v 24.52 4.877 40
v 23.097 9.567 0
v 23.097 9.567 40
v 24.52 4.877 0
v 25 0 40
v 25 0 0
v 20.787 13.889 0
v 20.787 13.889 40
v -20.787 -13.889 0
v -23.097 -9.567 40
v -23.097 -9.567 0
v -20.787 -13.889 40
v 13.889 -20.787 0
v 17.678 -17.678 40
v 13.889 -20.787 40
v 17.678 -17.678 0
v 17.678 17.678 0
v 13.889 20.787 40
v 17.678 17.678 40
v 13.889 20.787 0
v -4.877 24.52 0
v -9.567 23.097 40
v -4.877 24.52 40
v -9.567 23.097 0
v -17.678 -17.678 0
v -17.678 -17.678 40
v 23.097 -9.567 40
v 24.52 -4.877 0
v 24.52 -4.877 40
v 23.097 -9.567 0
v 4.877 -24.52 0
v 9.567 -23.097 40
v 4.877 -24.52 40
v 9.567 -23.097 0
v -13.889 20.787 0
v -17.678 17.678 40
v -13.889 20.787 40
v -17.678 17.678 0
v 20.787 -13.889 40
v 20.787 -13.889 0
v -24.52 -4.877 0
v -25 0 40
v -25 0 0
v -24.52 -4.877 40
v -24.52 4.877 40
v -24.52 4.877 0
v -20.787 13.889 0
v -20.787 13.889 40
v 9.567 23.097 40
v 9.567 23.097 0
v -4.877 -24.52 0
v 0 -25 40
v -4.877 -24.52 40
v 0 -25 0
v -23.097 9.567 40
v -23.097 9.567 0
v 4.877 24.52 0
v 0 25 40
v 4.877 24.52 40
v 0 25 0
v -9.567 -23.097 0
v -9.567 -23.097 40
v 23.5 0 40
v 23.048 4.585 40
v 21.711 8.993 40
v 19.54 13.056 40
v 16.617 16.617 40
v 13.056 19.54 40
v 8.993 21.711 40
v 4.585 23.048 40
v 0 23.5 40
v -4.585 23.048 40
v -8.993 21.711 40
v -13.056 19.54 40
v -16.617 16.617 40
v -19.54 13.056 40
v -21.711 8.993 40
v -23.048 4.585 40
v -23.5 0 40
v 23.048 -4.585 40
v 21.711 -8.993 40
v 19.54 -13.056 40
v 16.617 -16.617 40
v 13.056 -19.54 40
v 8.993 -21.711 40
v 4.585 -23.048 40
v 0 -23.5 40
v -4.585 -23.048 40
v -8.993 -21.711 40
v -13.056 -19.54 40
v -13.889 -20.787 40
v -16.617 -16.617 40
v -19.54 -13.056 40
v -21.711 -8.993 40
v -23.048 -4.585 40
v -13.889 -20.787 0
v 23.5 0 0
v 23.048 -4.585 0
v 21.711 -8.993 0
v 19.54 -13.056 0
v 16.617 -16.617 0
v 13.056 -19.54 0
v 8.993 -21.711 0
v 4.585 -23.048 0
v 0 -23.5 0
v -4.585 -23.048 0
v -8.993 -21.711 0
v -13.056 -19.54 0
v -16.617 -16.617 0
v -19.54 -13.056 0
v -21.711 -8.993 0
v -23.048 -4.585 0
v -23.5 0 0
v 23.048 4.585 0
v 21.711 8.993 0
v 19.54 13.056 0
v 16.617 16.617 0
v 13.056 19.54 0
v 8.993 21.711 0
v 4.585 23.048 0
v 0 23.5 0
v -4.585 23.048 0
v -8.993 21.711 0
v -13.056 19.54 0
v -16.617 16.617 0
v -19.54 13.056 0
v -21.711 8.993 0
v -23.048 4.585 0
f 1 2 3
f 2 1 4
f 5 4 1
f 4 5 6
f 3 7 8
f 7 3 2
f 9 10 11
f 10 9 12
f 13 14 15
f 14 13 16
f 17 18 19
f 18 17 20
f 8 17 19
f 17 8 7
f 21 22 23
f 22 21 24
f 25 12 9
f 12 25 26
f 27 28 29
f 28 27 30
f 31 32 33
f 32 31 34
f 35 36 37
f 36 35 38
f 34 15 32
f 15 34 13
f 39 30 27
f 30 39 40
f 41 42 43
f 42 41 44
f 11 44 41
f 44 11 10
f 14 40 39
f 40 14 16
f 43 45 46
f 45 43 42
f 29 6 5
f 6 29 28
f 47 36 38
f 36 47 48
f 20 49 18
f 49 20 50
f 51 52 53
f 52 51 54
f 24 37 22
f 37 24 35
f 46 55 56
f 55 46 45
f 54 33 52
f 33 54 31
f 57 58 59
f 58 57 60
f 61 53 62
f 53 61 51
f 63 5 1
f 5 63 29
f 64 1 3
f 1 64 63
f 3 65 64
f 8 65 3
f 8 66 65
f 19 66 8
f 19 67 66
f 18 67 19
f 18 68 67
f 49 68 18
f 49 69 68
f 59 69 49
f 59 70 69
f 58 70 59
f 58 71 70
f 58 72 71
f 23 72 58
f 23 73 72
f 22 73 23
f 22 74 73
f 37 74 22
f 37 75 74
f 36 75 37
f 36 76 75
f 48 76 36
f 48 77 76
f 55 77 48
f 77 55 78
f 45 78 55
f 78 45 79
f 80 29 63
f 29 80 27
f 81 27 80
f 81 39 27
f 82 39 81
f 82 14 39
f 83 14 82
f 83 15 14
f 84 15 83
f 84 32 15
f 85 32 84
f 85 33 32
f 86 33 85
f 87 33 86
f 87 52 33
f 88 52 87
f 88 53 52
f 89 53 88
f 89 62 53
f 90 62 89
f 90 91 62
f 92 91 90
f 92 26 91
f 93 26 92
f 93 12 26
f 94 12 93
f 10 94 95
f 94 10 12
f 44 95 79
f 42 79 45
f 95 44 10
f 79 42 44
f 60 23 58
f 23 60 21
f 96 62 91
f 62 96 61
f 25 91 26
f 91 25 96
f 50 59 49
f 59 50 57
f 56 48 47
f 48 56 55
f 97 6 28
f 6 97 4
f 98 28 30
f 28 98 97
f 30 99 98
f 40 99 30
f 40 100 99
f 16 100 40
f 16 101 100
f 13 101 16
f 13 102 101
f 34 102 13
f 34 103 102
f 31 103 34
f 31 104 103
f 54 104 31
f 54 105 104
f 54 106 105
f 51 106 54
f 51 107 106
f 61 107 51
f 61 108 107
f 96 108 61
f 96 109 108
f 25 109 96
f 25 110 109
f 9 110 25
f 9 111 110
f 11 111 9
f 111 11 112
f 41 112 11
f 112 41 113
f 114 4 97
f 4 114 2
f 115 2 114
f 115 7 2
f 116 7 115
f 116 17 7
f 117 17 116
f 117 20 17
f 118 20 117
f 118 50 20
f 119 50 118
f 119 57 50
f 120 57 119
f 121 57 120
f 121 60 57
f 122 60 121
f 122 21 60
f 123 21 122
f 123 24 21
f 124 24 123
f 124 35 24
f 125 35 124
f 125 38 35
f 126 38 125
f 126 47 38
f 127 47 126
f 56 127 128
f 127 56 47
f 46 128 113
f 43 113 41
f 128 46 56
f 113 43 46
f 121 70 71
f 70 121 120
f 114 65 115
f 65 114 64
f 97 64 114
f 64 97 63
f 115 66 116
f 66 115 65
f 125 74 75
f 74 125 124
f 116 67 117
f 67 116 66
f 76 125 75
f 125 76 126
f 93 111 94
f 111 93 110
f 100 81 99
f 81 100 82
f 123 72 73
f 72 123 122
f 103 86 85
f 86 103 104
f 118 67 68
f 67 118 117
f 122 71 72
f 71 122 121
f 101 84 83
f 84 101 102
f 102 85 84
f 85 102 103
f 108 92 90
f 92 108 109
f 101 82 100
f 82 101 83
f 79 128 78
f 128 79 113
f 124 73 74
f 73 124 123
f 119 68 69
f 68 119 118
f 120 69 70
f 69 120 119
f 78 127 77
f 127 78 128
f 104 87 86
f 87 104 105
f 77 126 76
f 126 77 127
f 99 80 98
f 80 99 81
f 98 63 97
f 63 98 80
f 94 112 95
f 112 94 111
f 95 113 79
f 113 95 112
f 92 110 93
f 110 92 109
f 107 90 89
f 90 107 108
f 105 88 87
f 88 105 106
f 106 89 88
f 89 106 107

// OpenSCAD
$fn = 32;

// ----------------------------------------------------------------------
// Thin tube: 1.5 mm wall
// ----------------------------------------------------------------------

// --- parameters (mm) ---
tube_od = 50;             // outer diameter
tube_h = 40;              // height, Z
wall = 1.5;               // wall thickness

difference() {
  cylinder(h = tube_h, d = tube_od);
  translate([0, 0, -1]) cylinder(h = tube_h + 2, d = tube_od - 2 * wall);
}
